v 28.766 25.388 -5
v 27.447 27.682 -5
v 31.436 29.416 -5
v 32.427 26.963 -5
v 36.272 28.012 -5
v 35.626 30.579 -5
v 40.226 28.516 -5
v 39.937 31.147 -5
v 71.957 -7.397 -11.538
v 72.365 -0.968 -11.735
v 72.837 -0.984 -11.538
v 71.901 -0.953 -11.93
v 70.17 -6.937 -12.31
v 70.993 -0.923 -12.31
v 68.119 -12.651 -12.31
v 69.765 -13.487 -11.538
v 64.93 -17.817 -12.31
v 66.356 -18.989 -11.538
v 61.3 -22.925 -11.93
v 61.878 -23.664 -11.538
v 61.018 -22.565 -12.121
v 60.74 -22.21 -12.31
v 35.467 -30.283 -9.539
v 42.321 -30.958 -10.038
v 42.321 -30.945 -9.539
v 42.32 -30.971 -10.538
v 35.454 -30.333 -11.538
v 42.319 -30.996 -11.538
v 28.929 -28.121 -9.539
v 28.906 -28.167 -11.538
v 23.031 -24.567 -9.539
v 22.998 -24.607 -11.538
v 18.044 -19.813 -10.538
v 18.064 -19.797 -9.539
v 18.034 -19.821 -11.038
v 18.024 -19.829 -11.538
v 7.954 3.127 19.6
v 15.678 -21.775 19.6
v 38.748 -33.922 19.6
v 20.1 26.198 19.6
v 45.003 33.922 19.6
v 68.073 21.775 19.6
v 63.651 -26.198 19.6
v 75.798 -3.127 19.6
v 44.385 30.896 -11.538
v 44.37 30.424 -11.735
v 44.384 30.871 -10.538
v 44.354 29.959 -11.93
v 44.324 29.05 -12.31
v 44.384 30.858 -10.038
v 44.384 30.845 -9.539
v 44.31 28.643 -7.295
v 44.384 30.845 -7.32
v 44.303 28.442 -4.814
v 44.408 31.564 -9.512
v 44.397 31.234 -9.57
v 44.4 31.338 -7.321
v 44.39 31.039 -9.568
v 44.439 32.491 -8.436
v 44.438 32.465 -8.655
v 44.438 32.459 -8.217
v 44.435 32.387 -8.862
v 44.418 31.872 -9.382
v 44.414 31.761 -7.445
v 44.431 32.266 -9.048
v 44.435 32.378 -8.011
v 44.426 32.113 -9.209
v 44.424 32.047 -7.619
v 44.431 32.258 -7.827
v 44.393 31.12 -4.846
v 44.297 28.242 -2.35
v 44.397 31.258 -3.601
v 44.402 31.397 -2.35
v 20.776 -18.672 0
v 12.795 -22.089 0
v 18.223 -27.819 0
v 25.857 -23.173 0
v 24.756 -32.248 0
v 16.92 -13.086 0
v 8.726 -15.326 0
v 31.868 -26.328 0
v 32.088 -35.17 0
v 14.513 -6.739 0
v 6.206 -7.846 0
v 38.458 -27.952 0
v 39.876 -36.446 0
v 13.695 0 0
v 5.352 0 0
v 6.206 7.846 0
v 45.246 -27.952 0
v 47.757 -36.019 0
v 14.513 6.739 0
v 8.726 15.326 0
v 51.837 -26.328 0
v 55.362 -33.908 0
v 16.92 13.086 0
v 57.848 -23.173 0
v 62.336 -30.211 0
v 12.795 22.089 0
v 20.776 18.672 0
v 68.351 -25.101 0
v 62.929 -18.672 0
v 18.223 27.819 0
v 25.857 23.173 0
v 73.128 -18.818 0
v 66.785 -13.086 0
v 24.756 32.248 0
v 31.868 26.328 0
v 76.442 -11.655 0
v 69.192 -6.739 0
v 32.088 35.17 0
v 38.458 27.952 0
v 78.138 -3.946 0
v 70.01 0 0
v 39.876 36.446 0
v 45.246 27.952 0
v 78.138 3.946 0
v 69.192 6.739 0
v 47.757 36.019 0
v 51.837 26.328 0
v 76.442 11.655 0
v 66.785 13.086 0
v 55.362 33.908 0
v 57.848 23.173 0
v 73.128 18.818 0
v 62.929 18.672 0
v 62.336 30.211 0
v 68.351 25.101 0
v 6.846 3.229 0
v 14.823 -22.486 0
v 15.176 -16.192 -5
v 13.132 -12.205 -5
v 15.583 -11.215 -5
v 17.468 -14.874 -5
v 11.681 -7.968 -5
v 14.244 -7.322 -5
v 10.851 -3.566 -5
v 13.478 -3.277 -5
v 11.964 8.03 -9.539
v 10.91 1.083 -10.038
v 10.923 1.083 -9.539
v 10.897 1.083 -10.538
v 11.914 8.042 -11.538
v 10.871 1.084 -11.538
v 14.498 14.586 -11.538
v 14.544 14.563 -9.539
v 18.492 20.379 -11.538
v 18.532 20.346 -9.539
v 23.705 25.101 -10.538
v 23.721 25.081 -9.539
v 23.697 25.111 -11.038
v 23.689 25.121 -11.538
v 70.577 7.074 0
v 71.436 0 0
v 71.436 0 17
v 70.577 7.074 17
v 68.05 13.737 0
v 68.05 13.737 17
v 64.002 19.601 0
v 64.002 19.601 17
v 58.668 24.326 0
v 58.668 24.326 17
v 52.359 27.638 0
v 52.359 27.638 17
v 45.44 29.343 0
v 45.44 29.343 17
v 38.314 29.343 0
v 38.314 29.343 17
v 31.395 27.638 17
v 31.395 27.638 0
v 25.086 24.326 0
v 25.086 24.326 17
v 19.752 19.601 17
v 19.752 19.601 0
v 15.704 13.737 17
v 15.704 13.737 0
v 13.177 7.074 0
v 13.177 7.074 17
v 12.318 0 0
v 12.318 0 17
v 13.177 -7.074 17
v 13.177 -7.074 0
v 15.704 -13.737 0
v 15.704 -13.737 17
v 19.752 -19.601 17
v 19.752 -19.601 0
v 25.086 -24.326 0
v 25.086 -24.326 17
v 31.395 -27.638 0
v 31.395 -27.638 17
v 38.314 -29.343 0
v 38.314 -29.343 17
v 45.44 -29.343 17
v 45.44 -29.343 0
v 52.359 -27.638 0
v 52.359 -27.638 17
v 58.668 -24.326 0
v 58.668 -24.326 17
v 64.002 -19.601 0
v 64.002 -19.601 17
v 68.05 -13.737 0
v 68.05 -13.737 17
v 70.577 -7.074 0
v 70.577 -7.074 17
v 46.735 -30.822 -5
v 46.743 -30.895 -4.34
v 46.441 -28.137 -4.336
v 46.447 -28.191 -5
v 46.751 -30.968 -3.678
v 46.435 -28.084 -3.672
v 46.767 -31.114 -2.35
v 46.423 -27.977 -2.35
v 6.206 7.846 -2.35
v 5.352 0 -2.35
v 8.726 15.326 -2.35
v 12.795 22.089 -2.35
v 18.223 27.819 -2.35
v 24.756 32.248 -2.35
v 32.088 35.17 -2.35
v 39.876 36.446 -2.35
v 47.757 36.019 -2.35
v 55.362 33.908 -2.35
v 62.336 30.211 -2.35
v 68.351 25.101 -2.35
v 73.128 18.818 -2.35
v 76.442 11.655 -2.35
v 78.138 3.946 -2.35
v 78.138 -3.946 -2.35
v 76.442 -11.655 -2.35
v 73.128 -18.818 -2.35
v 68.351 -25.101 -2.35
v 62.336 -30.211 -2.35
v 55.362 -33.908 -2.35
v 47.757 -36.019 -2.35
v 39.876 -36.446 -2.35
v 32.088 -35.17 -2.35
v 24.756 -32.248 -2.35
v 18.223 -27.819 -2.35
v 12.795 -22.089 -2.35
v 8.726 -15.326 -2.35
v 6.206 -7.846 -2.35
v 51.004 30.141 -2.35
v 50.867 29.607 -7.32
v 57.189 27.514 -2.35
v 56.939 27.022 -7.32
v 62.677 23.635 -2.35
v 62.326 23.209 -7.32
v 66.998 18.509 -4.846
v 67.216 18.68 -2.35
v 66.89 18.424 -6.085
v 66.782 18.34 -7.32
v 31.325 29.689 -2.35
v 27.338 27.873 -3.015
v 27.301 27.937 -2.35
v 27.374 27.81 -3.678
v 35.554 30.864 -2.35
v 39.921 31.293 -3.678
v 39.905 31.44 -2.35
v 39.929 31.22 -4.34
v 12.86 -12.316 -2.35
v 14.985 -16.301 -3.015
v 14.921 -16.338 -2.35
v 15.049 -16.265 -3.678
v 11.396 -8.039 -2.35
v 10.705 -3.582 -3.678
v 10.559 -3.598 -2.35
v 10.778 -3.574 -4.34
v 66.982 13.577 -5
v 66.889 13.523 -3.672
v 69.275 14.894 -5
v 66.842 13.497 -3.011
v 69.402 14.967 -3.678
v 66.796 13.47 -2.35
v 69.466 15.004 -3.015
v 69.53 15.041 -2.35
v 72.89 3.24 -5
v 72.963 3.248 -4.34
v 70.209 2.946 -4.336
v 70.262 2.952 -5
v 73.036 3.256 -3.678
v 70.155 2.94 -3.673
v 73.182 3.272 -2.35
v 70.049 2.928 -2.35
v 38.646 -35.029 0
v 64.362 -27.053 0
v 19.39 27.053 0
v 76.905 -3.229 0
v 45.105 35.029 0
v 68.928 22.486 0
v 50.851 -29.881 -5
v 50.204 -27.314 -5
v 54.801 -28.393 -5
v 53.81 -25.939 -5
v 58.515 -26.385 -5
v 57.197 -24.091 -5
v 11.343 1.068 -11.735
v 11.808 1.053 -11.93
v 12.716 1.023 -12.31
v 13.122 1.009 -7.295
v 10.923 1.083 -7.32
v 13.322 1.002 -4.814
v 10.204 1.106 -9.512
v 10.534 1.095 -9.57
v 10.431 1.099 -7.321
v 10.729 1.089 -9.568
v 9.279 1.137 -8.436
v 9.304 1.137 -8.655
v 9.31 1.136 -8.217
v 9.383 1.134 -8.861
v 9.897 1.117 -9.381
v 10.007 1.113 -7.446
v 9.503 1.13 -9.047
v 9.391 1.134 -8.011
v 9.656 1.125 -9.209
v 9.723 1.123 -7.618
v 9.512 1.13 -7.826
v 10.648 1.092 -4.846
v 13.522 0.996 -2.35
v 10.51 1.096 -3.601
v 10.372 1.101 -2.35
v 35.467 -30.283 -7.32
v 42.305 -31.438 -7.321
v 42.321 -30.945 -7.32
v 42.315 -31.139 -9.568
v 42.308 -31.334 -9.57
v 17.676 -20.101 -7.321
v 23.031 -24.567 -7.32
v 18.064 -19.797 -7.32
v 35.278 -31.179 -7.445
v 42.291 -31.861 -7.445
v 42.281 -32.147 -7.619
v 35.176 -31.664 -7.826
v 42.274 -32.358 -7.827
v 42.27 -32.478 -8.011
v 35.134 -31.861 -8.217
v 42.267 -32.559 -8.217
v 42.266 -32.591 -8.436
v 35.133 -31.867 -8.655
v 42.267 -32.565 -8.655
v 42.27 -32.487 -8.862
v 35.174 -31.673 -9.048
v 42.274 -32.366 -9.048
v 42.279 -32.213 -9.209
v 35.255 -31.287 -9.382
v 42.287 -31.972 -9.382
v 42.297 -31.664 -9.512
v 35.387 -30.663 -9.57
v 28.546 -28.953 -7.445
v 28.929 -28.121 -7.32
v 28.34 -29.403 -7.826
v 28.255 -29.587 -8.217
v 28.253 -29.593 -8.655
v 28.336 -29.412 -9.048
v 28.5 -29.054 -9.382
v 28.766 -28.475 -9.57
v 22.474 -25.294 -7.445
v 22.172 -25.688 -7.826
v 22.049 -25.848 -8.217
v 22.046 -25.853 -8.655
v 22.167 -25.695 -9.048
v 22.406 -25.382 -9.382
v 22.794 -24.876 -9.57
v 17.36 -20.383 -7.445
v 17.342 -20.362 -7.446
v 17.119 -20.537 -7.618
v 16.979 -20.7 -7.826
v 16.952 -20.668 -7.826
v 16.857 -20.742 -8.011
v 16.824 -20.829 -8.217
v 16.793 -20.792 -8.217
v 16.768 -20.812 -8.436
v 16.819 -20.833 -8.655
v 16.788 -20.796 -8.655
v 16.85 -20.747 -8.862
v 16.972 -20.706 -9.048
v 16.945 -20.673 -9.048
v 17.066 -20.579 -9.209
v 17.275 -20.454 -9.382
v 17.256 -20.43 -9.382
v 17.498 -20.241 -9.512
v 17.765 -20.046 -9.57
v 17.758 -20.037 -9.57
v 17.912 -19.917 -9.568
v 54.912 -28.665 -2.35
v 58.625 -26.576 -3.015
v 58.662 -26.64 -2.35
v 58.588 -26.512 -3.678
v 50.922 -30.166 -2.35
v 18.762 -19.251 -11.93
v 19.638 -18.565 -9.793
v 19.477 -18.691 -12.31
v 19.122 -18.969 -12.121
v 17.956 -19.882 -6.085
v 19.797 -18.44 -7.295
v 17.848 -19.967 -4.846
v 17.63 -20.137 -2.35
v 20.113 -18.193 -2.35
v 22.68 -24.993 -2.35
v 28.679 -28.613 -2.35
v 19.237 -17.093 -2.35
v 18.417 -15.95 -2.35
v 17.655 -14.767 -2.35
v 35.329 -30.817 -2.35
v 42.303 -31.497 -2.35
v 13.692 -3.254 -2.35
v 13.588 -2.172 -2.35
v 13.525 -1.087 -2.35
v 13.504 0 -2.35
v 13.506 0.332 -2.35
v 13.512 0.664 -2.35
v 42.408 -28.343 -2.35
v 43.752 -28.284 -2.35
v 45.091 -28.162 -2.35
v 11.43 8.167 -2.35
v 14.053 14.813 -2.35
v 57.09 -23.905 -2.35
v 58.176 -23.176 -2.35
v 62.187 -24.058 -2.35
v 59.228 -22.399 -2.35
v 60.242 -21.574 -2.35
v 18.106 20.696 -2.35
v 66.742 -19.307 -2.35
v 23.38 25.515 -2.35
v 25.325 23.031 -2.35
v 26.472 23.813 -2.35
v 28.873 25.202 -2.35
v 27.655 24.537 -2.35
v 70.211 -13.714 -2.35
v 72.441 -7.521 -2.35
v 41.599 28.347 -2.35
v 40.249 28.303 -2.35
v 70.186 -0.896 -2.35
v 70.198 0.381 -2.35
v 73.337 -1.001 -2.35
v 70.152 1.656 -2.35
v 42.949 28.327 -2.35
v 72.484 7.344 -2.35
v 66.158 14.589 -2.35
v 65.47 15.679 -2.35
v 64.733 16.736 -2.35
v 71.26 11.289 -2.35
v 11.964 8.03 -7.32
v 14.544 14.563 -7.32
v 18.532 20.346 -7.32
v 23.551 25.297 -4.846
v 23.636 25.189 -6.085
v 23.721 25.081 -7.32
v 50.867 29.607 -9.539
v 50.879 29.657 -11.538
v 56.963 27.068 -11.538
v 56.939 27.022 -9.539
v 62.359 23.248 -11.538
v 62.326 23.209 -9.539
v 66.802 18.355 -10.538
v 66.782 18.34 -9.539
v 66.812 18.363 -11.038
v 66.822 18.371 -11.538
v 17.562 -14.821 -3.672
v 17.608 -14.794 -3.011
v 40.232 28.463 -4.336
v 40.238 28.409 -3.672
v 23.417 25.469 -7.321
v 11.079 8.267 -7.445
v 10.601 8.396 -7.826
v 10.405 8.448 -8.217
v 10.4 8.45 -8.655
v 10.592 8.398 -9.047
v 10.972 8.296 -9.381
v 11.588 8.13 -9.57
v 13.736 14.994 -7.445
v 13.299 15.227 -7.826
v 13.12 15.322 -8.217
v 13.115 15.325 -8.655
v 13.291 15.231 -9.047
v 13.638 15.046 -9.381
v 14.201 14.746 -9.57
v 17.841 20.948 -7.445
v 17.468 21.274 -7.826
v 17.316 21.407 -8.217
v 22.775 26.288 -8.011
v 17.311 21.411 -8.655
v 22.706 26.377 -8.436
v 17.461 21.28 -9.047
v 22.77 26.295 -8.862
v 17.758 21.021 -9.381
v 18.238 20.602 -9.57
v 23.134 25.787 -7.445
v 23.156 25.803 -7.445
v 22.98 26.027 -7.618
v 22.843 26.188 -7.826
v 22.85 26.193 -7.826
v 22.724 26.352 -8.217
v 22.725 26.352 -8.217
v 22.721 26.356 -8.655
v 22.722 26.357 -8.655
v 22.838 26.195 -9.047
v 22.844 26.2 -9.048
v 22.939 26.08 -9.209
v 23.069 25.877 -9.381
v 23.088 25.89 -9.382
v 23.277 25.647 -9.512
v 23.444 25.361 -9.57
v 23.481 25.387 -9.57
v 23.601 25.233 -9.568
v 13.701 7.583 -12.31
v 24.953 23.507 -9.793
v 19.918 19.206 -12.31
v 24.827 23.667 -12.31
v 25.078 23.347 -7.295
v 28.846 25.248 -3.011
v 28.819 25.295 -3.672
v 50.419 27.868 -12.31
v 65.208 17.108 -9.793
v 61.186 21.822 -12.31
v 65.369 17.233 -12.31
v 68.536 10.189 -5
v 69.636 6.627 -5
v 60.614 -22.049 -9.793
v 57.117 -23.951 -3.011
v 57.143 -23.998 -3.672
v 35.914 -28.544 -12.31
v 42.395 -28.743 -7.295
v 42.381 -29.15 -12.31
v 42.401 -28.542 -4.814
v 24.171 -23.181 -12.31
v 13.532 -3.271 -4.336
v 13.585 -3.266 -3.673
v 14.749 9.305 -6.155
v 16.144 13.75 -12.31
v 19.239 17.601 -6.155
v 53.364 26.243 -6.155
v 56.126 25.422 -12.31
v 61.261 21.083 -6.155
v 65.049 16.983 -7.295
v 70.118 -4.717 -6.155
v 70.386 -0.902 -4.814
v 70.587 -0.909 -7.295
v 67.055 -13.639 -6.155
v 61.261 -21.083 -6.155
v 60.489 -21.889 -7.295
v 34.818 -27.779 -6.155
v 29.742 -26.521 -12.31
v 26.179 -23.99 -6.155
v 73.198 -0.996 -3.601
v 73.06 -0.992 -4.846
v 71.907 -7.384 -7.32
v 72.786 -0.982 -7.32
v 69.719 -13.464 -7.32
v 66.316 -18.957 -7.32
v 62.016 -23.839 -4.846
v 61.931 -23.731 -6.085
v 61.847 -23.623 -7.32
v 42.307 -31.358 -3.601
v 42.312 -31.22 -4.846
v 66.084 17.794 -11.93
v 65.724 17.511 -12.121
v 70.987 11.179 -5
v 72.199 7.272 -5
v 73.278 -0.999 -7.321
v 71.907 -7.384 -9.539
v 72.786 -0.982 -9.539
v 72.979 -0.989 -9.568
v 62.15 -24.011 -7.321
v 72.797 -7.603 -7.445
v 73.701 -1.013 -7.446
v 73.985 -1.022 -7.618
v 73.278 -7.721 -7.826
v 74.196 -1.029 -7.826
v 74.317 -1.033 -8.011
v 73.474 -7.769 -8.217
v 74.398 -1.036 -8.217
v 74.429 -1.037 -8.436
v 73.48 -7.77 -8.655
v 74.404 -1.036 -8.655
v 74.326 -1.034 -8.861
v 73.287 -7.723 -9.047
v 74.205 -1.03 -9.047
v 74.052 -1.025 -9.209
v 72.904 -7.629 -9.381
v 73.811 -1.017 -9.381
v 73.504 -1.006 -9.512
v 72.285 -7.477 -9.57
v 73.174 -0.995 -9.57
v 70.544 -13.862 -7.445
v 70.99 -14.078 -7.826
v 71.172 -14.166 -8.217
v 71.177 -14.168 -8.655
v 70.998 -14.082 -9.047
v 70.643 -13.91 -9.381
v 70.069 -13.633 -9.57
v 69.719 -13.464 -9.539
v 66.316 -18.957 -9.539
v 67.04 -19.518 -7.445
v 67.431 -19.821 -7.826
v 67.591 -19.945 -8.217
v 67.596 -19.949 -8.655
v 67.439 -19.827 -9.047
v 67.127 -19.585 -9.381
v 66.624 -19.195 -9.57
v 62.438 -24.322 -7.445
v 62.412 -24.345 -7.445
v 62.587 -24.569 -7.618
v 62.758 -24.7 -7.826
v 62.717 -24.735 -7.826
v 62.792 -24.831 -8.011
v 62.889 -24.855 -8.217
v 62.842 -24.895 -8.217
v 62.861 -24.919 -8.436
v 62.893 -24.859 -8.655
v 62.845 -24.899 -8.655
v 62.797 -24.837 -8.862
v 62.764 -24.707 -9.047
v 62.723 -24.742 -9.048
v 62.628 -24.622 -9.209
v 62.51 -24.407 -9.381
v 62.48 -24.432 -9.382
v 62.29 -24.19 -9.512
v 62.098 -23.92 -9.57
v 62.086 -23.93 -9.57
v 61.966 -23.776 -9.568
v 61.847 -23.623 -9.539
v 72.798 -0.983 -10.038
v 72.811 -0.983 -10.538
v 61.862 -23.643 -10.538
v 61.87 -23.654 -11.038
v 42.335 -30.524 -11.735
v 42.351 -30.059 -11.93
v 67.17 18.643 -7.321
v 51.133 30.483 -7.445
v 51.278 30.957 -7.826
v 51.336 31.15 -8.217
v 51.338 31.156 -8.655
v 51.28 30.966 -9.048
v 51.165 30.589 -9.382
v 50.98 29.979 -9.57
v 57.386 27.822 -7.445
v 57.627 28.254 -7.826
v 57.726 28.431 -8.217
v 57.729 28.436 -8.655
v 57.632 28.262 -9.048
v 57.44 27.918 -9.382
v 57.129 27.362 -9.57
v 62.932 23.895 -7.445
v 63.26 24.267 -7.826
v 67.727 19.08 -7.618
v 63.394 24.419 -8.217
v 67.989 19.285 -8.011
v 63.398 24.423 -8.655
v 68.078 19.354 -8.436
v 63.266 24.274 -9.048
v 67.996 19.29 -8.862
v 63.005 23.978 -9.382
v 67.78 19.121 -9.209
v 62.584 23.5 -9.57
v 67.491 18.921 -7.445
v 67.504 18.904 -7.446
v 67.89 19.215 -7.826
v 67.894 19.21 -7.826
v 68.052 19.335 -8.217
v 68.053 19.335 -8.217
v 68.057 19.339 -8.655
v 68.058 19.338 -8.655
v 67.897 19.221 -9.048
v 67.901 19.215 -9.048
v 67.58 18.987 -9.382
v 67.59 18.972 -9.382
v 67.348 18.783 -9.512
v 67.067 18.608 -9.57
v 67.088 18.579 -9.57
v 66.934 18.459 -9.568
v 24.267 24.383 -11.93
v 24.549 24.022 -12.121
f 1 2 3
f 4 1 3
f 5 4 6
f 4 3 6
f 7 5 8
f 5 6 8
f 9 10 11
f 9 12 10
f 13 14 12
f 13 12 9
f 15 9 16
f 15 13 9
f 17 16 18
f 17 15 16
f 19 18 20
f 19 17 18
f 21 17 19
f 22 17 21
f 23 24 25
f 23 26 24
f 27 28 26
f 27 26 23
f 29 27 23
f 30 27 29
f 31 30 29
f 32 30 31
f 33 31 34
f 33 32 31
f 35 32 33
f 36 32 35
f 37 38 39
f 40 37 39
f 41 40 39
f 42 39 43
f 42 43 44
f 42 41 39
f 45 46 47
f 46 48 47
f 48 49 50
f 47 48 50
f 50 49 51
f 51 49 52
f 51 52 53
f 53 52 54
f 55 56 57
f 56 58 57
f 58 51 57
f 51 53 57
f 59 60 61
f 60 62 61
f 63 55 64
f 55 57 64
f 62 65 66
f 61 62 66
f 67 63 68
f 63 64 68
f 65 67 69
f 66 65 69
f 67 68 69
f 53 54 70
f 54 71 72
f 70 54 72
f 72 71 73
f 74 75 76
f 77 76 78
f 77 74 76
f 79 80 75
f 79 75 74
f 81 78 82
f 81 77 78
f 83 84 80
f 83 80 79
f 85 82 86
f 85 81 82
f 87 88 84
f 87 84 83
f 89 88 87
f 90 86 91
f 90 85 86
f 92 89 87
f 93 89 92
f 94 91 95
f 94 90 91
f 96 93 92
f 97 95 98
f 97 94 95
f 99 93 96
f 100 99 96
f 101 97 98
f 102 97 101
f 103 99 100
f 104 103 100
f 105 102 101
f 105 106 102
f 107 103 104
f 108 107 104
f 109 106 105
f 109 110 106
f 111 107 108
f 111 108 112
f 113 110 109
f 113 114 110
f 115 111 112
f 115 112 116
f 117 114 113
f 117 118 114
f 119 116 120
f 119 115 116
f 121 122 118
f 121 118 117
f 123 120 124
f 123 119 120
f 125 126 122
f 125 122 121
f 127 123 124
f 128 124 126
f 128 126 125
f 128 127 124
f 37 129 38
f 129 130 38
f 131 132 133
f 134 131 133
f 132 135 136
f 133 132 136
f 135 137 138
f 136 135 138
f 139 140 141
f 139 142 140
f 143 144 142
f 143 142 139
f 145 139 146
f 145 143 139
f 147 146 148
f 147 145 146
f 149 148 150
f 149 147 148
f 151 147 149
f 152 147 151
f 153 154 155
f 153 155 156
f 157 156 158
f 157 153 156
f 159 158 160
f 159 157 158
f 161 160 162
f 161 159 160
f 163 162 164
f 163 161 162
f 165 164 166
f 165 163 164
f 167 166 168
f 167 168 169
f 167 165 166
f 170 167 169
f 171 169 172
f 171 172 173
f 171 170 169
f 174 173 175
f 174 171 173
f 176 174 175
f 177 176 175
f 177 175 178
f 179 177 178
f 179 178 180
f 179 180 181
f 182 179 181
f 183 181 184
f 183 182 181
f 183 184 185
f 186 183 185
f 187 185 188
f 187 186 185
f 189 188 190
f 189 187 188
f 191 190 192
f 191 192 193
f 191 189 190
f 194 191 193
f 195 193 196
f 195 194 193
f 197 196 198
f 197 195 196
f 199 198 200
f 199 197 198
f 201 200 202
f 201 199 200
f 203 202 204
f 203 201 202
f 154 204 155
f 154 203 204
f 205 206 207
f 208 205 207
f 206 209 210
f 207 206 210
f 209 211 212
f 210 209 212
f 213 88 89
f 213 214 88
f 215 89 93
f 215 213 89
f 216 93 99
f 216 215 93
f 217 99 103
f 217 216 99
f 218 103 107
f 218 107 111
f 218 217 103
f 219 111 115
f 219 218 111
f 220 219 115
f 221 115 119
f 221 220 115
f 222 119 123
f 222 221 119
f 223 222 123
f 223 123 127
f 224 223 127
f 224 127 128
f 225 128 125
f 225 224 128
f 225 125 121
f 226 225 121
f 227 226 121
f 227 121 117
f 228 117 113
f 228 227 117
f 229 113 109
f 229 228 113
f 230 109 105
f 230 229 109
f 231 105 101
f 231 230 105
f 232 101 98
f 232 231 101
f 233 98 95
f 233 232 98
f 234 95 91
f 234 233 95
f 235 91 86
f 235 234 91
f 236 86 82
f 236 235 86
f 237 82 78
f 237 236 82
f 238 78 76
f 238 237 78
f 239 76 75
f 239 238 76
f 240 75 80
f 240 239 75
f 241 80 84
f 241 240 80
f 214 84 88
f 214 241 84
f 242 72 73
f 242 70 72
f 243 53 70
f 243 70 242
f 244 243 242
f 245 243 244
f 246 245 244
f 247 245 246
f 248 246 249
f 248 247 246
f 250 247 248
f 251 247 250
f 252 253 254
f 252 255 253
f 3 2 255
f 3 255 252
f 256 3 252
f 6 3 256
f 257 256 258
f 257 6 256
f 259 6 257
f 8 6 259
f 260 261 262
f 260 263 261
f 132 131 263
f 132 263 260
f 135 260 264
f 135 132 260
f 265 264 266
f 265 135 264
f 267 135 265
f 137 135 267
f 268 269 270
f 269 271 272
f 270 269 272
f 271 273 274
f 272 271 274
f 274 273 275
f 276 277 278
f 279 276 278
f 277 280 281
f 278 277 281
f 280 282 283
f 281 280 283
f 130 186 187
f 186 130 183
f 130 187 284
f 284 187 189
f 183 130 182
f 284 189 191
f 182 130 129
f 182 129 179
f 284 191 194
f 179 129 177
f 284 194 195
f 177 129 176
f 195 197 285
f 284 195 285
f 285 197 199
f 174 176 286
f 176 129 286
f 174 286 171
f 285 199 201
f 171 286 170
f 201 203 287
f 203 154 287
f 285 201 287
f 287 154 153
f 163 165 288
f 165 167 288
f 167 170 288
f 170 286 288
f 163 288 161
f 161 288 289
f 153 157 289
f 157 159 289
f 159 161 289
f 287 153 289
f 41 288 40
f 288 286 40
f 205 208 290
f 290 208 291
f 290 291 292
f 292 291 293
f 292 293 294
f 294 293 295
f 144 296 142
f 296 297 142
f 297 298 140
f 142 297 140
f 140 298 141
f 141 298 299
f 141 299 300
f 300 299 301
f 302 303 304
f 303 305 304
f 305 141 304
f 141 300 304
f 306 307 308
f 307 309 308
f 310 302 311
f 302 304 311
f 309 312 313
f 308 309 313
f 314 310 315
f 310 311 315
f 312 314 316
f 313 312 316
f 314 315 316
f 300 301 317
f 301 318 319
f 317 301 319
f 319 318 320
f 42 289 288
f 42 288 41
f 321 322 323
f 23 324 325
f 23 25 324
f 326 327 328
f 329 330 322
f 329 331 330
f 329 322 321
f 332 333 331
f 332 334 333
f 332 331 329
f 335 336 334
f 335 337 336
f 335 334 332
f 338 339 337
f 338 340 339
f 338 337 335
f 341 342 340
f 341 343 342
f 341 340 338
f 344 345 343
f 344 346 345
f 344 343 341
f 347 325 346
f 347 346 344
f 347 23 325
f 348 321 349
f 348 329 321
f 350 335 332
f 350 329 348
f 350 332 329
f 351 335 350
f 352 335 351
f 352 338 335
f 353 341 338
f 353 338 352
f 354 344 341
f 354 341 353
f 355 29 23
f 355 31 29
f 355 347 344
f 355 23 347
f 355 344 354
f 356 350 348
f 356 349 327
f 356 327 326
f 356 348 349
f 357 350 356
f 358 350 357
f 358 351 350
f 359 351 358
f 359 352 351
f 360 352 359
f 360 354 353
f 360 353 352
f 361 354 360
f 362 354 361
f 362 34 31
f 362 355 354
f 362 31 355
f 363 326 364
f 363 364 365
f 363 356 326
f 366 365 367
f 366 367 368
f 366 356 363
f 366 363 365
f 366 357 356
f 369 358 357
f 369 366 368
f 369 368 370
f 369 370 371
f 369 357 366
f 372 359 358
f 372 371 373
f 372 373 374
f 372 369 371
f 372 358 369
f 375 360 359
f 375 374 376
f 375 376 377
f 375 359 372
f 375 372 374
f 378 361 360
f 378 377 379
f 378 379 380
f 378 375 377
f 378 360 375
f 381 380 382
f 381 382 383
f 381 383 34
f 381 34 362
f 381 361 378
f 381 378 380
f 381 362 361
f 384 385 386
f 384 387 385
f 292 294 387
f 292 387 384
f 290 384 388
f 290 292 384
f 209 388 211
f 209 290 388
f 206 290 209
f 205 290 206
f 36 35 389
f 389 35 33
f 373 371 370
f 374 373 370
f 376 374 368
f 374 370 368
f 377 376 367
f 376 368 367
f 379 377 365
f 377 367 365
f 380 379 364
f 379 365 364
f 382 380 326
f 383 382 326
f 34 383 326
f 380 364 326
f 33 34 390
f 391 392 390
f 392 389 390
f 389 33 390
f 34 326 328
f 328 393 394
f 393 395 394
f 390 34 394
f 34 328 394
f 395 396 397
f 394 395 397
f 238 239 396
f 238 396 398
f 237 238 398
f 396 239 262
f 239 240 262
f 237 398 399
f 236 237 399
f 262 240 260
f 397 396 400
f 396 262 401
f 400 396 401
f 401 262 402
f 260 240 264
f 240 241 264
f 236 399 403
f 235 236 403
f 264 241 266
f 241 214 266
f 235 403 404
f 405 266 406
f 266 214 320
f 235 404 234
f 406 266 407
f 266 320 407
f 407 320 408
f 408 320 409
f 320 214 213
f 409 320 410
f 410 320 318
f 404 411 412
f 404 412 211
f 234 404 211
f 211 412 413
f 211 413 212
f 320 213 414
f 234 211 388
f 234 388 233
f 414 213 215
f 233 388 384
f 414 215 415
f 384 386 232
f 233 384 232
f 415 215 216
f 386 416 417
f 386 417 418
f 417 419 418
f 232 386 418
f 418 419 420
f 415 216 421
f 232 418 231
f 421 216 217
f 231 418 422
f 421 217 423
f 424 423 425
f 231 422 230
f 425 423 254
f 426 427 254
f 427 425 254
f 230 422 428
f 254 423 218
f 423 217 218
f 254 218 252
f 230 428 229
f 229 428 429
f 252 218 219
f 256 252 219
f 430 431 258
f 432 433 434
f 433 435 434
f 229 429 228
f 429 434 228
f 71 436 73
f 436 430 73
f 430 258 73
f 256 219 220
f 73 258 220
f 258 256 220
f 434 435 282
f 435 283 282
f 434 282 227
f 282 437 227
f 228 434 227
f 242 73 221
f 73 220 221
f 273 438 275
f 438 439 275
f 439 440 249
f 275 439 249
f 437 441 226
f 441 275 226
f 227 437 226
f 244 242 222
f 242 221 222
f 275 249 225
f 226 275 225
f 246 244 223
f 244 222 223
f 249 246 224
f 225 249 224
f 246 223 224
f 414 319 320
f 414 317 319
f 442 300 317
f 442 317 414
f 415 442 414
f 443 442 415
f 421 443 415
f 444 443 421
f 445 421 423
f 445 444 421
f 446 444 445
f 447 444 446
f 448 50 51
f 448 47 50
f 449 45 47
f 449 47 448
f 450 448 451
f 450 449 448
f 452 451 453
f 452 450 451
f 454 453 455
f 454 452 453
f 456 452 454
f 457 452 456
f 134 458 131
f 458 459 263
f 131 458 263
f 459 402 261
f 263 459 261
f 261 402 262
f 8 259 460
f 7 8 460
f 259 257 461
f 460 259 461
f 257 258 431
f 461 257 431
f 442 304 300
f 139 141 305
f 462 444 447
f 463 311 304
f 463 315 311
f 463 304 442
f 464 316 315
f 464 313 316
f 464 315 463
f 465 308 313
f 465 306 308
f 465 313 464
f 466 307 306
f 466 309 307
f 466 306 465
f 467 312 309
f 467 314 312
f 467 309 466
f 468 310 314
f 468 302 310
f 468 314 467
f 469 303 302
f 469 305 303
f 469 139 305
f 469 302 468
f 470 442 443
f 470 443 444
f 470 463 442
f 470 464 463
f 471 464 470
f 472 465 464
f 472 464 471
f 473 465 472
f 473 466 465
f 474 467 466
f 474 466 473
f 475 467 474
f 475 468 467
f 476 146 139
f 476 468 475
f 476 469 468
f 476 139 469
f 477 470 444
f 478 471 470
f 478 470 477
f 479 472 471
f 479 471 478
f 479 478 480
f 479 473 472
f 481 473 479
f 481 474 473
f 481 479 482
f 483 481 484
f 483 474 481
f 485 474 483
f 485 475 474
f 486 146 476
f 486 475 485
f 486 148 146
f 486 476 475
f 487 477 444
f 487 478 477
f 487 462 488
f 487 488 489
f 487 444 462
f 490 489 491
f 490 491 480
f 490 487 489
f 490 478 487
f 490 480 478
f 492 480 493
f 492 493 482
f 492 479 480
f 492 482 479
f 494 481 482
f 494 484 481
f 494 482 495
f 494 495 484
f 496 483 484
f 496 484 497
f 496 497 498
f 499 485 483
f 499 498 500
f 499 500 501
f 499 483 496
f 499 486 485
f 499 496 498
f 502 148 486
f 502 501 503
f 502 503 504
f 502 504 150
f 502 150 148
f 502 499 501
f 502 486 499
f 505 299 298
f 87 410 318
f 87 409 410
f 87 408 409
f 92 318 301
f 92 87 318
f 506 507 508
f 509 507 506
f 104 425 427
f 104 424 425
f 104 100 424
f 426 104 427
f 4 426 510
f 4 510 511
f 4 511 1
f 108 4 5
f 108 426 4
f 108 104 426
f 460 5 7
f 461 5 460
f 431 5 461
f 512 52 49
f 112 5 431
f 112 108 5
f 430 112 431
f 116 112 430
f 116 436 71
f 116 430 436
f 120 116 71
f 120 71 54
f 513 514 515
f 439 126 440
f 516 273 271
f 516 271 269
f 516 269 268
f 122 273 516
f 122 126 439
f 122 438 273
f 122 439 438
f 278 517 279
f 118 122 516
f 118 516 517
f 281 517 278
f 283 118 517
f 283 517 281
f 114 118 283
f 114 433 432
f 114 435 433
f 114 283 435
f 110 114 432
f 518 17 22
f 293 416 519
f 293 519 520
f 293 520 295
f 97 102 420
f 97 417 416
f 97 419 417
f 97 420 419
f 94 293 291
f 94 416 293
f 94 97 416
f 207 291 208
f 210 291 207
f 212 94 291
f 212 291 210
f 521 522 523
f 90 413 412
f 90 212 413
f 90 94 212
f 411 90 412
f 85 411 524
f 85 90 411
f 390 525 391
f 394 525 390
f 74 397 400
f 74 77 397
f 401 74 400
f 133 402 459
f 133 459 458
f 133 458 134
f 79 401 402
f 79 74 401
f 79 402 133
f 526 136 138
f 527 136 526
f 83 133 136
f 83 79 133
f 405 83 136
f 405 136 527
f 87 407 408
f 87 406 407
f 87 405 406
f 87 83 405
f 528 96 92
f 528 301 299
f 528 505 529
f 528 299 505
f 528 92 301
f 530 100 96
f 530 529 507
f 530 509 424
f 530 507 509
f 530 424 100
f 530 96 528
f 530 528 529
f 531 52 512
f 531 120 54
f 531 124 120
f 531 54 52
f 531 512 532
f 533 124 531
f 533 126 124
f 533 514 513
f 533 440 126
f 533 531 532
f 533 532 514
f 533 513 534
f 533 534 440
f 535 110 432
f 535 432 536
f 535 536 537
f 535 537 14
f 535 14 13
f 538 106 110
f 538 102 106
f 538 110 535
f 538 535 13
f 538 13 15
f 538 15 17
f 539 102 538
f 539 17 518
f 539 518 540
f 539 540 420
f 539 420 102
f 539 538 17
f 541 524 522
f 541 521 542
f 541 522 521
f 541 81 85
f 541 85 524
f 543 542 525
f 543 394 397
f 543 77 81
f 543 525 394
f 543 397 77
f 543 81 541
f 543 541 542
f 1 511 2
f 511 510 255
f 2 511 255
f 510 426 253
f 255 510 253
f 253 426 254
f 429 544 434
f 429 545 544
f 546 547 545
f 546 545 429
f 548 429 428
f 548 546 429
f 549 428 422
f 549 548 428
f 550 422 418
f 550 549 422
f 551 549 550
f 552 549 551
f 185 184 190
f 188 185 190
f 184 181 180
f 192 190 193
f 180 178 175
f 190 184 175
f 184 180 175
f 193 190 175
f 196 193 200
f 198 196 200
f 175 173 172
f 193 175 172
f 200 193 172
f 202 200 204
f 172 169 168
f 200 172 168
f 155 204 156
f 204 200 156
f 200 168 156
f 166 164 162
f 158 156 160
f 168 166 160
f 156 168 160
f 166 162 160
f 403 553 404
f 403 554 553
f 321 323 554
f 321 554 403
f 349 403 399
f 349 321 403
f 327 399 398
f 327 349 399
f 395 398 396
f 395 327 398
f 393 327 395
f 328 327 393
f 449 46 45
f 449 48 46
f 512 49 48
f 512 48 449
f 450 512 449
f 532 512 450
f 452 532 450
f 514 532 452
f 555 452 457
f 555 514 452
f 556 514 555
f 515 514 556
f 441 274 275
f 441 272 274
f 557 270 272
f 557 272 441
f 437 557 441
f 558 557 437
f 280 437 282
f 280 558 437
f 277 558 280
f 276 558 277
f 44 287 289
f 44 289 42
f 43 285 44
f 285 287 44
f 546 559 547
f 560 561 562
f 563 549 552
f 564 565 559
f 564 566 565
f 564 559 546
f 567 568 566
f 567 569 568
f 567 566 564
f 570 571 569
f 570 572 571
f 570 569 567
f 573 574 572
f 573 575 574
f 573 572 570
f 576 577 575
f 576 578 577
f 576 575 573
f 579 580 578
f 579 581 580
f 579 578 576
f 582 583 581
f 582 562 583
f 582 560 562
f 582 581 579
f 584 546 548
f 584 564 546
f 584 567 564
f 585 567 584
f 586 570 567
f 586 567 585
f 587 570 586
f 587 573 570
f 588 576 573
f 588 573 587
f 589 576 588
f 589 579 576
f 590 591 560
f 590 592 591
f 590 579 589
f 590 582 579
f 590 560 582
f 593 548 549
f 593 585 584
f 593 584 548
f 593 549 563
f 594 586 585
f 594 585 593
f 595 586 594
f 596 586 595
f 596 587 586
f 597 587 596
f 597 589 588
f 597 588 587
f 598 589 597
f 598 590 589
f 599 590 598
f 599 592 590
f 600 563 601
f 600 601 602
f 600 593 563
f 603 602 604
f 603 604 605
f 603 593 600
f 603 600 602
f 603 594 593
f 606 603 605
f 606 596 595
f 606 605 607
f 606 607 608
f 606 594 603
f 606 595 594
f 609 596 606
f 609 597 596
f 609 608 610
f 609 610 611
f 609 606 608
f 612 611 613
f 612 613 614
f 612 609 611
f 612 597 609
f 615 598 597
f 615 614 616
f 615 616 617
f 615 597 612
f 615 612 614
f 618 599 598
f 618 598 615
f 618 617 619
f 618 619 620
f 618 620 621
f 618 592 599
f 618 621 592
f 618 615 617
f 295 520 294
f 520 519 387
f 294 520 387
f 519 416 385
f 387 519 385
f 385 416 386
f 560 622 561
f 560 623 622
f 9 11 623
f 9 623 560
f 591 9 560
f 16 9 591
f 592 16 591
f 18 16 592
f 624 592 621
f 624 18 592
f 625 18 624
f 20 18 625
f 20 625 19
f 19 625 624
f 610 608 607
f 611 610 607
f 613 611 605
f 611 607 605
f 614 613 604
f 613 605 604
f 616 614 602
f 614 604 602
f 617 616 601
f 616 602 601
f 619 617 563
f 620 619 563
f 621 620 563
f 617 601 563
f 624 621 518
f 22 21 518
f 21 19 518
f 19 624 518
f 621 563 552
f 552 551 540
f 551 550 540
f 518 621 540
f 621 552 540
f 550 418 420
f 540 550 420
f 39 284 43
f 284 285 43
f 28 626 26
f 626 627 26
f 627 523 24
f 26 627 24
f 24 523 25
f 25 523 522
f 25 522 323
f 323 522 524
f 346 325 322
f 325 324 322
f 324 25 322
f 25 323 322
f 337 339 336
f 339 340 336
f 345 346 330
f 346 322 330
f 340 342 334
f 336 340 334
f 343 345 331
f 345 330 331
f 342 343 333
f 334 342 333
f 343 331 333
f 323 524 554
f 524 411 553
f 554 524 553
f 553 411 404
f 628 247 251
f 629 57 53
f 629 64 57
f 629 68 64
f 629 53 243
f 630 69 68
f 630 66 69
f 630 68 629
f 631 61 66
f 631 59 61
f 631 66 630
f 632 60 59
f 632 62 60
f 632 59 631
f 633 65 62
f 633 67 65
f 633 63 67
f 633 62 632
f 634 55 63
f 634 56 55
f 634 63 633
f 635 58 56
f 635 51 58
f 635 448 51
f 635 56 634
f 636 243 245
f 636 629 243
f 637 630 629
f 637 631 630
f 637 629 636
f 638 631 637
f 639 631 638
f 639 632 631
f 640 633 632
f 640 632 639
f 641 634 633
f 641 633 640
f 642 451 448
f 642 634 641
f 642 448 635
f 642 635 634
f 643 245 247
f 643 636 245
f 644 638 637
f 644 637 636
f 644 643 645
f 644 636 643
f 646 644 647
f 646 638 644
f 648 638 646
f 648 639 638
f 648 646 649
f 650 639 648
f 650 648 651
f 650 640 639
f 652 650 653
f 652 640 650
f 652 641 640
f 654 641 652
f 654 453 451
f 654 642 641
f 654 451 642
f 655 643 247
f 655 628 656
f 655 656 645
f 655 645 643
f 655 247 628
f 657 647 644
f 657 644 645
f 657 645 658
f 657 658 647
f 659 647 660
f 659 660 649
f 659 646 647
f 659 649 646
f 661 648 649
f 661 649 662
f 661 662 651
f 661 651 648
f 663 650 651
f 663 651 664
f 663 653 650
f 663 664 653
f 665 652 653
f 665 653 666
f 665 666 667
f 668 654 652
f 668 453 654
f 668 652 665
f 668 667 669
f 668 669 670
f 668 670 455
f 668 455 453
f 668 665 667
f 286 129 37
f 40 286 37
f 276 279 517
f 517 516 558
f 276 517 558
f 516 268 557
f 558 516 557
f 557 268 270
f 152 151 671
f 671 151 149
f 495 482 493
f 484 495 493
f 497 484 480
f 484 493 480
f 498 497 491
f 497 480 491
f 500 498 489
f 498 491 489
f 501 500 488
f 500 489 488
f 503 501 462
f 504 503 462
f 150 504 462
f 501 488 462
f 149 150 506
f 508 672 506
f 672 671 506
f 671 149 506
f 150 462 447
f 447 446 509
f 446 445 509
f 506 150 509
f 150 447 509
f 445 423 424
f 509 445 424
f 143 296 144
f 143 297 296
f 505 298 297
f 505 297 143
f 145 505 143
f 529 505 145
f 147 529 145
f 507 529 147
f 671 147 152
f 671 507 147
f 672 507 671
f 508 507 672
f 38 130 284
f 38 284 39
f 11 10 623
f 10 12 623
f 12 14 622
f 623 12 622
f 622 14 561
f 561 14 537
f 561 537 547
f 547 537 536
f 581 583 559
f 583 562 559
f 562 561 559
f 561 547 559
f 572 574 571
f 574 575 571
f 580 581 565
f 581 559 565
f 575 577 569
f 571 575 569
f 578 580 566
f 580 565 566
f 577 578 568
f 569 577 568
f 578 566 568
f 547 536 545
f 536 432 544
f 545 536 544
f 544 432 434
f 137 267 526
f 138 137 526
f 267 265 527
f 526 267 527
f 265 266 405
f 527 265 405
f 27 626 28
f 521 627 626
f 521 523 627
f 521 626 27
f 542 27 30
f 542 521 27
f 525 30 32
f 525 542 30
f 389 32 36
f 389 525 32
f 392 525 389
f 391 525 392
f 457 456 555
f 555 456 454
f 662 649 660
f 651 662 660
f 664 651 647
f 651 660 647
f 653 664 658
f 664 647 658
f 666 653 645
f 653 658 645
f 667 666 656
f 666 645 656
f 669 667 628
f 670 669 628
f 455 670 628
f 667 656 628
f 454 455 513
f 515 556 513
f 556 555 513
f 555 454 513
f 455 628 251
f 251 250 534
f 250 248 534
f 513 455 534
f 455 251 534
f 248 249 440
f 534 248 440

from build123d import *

# Parameters (mm, degrees)
F1_DEPTH  = 19.6
F1_TAPER  = 3
F6_R      = 29.5588051004
F7_DEPTH  = 17
F10_START = -5
F10_DEPTH = 20
F13_DEPTH = 10


# Not quite as in the source:
# - the program builds the solid bodies; features that only make, move or delete a surface that nothing else refers to are left out


with BuildPart() as f1:
    # F0 (on Top) → F1 (new body)
    with BuildSketch(Plane.XY):
        Polygon((6.846458452, 3.2292531715), (14.8228506263, -22.4859673376), (38.6464184239, -35.0292131433), (64.3616389329, -27.052820969), (76.9048847387, -3.2292531715), (68.9284925643, 22.4859673376), (45.1049247668, 35.0292131433), (19.3897042578, 27.052820969), align=None)
    extrude(amount=F1_DEPTH, taper=F1_TAPER)

    # F6 (on Top) → F7 (cut)
    with BuildSketch(Plane.XY):
        with Locations((41.8770387769, 0)):
            Circle(F6_R)
    extrude(amount=F7_DEPTH, mode=Mode.SUBTRACT)


with BuildPart() as f5:
    # F4 (on Front) → F5 (revolve)
    with BuildSketch(Plane.XZ):
        with BuildLine():
            Line((12.6976181568, -12.3096757326), (13.6948058819, 0))
            Line((13.6948058819, 0), (10.6566109201, 0))
            Line((10.6566109201, 0), (5.3524481356, 0))
            Line((5.3524481356, 0), (5.3524481356, -2.35))
            Line((5.3524481356, -2.35), (10.3524481356, -2.35))
            Line((10.3524481356, -2.35), (10.9037844754, -7.3195098592))
            add(Edge.make_bspline(
                [(10.9037844754, -7.3195098592), (9.9054742604, -7.188339252), (8.526802396, -8.5542281967), (10.0830420852, -9.7186826169), (10.9037844754, -9.5387469869)],
                knots=[0, 0, 0, 0, 0.5064173363, 1, 1, 1, 1], degree=3))
            Line((10.9037844754, -9.5387469869), (10.8524481356, -11.5380880234))
            Line((10.8524481356, -11.5380880234), (12.6976181568, -12.3096757326))
        make_face()
    revolve(axis=Axis((41.8524481356, 0, -10.1716983277), (0, 0, -1)))


with BuildPart() as f10:
    # F9 (on Top) → F10 (new body)
    with BuildSketch(Plane.XY.offset(F10_START)):
        Polygon((42.6140986383, -43.1583486497), (69.8464736342, -34.131936729), (60.4310854986, -22.0097155725), (42.8283442474, -28.884228869), align=None)
        Polygon((42.8283442474, -28.884228869), (60.4310854986, -22.0097155725), (43.3466422396, -0.013660122), (43.260671187, -0.0804342567), align=None)
        Polygon((43.260671187, -0.0804342567), (43.3466422396, -0.013660122), (43.3372866763, -0.0016149246), (43.2618701985, -0.0005500774), align=None)
        Polygon((43.3372866763, -0.0016149246), (43.3466422396, -0.013660122), (43.3617063937, -0.0019597202), align=None)
        Polygon((43.2618701985, -0.0005500774), (43.3372866763, -0.0016149246), (43.2632842698, 0.093662458), align=None)
        Polygon((19.4793593917, -18.5514948023), (43.260671187, -0.0804342567), (43.2618701985, -0.0005500774), (43.2229116559, 0), (12.5911462439, 0.4803054209), align=None)
        Polygon((9.1356113553, -26.585534215), (19.4793593917, -18.5514948023), (12.5911462439, 0.4803054209), (0, 0.6777343224), align=None)
    extrude(amount=-F10_DEPTH)


with BuildPart() as f10b:
    # F9 (on Top) → F10, piece 2 (new body)
    with BuildSketch(Plane.XY.offset(F10_START)):
        Polygon((24.825832521, 23.8317032525), (43.2632842698, 0.093662458), (43.6881296354, 28.3989969936), align=None)
        Polygon((16.3248591125, 34.7766242921), (24.825832521, 23.8317032525), (43.6881296354, 28.3989969936), (43.9111739397, 43.2593300939), align=None)
    extrude(amount=-F10_DEPTH)


with BuildPart() as f10c:
    # F9 (on Top) → F10, piece 3 (new body)
    with BuildSketch(Plane.XY.offset(F10_START)):
        Polygon((65.2221173543, 16.9771278037), (43.3617063937, -0.0019597202), (71.1709585301, -0.3946140477), align=None)
        Polygon((79.0283353161, 27.7004844491), (65.2221173543, 16.9771278037), (71.1709585301, -0.3946140477), (86.5694135427, -0.6120334147), align=None)
    extrude(amount=-F10_DEPTH)


with BuildPart() as f5_1:
    add(f5.part)

    # F11: cut F10, F10c, F10b
    add(f10.part, mode=Mode.SUBTRACT)
    add(f10c.part, mode=Mode.SUBTRACT)
    add(f10b.part, mode=Mode.SUBTRACT)


with BuildPart() as f13:
    # F12 (on Top) → F13 (new body)
    with BuildSketch(Plane.XY):
        Polygon((81.2726734822, 21.7885523797), (76.6011070263, 26.0260878816), (43.354075402, 0), align=None)
    extrude(amount=-F13_DEPTH)


with BuildPart() as f13b:
    # F12 (on Top) → F13, piece 2 (new body)
    with BuildSketch(Plane.XY):
        Polygon((85.3246003462, 4.6040632222), (43.354075402, 0), (87.0625718818, -1.4589142), align=None)
    extrude(amount=-F13_DEPTH)


with BuildPart() as f13c:
    # F12 (on Top) → F13, piece 3 (new body)
    with BuildSketch(Plane.XY):
        Polygon((74.1051476533, -39.282963935), (43.354075402, 0), (69.7669919231, -45.9663748299), align=None)
    extrude(amount=-F13_DEPTH)


with BuildPart() as f13d:
    # F12 (on Top) → F13, piece 4 (new body)
    with BuildSketch(Plane.XY):
        Polygon((48.7939971237, -49.5901900761), (43.354075402, 0), (41.5855238111, -52.9851111108), align=None)
    extrude(amount=-F13_DEPTH)


with BuildPart() as f13e:
    # F12 (on Top) → F13, piece 5 (new body)
    with BuildSketch(Plane.XY):
        Polygon((5.9819950958, -29.2552146417), (43.354075402, 0), (1.6118744296, -23.9856476341), align=None)
    extrude(amount=-F13_DEPTH)


with BuildPart() as f13f:
    # F12 (on Top) → F13, piece 6 (new body)
    with BuildSketch(Plane.XY):
        Polygon((-3.8238455154, -5.1753017358), (43.354075402, 0), (-4.7618607516, 1.6060269319), align=None)
    extrude(amount=-F13_DEPTH)


with BuildPart() as f13g:
    # F12 (on Top) → F13, piece 7 (new body)
    with BuildSketch(Plane.XY):
        Polygon((14.7173287406, 36.5820182504), (43.354075402, 0), (20.0315345828, 40.5881967797), align=None)
    extrude(amount=-F13_DEPTH)


with BuildPart() as f13h:
    # F12 (on Top) → F13, piece 8 (new body)
    with BuildSketch(Plane.XY):
        Polygon((38.2881817991, 46.1805591199), (43.354075402, 0), (44.9157021402, 46.7857237843), align=None)
    extrude(amount=-F13_DEPTH)


with BuildPart() as f13g_1:
    # F14: moved
    add(f13g.part.moved(Location((0, 0, -2.35))))


with BuildPart() as f13f_1:
    # F14: moved
    add(f13f.part.moved(Location((0, 0, -2.35))))


with BuildPart() as f13e_1:
    # F14: moved
    add(f13e.part.moved(Location((0, 0, -2.35))))


with BuildPart() as f13d_1:
    # F14: moved
    add(f13d.part.moved(Location((0, 0, -2.35))))


with BuildPart() as f13c_1:
    # F14: moved
    add(f13c.part.moved(Location((0, 0, -2.35))))


with BuildPart() as f13b_1:
    # F14: moved
    add(f13b.part.moved(Location((0, 0, -2.35))))


with BuildPart() as f13_1:
    # F14: moved
    add(f13.part.moved(Location((0, 0, -2.35))))


with BuildPart() as f13h_1:
    # F14: moved
    add(f13h.part.moved(Location((0, 0, -2.35))))


with BuildPart() as f5_2:
    add(f5_1.part)

    # F15: cut F13g, F13f, F13e, F13d, F13c, F13b, F13, F13h
    add(f13g_1.part, mode=Mode.SUBTRACT)
    add(f13f_1.part, mode=Mode.SUBTRACT)
    add(f13e_1.part, mode=Mode.SUBTRACT)
    add(f13d_1.part, mode=Mode.SUBTRACT)
    add(f13c_1.part, mode=Mode.SUBTRACT)
    add(f13b_1.part, mode=Mode.SUBTRACT)
    add(f13_1.part, mode=Mode.SUBTRACT)
    add(f13h_1.part, mode=Mode.SUBTRACT)


solid = Compound([f1.part, f5_2.part])
